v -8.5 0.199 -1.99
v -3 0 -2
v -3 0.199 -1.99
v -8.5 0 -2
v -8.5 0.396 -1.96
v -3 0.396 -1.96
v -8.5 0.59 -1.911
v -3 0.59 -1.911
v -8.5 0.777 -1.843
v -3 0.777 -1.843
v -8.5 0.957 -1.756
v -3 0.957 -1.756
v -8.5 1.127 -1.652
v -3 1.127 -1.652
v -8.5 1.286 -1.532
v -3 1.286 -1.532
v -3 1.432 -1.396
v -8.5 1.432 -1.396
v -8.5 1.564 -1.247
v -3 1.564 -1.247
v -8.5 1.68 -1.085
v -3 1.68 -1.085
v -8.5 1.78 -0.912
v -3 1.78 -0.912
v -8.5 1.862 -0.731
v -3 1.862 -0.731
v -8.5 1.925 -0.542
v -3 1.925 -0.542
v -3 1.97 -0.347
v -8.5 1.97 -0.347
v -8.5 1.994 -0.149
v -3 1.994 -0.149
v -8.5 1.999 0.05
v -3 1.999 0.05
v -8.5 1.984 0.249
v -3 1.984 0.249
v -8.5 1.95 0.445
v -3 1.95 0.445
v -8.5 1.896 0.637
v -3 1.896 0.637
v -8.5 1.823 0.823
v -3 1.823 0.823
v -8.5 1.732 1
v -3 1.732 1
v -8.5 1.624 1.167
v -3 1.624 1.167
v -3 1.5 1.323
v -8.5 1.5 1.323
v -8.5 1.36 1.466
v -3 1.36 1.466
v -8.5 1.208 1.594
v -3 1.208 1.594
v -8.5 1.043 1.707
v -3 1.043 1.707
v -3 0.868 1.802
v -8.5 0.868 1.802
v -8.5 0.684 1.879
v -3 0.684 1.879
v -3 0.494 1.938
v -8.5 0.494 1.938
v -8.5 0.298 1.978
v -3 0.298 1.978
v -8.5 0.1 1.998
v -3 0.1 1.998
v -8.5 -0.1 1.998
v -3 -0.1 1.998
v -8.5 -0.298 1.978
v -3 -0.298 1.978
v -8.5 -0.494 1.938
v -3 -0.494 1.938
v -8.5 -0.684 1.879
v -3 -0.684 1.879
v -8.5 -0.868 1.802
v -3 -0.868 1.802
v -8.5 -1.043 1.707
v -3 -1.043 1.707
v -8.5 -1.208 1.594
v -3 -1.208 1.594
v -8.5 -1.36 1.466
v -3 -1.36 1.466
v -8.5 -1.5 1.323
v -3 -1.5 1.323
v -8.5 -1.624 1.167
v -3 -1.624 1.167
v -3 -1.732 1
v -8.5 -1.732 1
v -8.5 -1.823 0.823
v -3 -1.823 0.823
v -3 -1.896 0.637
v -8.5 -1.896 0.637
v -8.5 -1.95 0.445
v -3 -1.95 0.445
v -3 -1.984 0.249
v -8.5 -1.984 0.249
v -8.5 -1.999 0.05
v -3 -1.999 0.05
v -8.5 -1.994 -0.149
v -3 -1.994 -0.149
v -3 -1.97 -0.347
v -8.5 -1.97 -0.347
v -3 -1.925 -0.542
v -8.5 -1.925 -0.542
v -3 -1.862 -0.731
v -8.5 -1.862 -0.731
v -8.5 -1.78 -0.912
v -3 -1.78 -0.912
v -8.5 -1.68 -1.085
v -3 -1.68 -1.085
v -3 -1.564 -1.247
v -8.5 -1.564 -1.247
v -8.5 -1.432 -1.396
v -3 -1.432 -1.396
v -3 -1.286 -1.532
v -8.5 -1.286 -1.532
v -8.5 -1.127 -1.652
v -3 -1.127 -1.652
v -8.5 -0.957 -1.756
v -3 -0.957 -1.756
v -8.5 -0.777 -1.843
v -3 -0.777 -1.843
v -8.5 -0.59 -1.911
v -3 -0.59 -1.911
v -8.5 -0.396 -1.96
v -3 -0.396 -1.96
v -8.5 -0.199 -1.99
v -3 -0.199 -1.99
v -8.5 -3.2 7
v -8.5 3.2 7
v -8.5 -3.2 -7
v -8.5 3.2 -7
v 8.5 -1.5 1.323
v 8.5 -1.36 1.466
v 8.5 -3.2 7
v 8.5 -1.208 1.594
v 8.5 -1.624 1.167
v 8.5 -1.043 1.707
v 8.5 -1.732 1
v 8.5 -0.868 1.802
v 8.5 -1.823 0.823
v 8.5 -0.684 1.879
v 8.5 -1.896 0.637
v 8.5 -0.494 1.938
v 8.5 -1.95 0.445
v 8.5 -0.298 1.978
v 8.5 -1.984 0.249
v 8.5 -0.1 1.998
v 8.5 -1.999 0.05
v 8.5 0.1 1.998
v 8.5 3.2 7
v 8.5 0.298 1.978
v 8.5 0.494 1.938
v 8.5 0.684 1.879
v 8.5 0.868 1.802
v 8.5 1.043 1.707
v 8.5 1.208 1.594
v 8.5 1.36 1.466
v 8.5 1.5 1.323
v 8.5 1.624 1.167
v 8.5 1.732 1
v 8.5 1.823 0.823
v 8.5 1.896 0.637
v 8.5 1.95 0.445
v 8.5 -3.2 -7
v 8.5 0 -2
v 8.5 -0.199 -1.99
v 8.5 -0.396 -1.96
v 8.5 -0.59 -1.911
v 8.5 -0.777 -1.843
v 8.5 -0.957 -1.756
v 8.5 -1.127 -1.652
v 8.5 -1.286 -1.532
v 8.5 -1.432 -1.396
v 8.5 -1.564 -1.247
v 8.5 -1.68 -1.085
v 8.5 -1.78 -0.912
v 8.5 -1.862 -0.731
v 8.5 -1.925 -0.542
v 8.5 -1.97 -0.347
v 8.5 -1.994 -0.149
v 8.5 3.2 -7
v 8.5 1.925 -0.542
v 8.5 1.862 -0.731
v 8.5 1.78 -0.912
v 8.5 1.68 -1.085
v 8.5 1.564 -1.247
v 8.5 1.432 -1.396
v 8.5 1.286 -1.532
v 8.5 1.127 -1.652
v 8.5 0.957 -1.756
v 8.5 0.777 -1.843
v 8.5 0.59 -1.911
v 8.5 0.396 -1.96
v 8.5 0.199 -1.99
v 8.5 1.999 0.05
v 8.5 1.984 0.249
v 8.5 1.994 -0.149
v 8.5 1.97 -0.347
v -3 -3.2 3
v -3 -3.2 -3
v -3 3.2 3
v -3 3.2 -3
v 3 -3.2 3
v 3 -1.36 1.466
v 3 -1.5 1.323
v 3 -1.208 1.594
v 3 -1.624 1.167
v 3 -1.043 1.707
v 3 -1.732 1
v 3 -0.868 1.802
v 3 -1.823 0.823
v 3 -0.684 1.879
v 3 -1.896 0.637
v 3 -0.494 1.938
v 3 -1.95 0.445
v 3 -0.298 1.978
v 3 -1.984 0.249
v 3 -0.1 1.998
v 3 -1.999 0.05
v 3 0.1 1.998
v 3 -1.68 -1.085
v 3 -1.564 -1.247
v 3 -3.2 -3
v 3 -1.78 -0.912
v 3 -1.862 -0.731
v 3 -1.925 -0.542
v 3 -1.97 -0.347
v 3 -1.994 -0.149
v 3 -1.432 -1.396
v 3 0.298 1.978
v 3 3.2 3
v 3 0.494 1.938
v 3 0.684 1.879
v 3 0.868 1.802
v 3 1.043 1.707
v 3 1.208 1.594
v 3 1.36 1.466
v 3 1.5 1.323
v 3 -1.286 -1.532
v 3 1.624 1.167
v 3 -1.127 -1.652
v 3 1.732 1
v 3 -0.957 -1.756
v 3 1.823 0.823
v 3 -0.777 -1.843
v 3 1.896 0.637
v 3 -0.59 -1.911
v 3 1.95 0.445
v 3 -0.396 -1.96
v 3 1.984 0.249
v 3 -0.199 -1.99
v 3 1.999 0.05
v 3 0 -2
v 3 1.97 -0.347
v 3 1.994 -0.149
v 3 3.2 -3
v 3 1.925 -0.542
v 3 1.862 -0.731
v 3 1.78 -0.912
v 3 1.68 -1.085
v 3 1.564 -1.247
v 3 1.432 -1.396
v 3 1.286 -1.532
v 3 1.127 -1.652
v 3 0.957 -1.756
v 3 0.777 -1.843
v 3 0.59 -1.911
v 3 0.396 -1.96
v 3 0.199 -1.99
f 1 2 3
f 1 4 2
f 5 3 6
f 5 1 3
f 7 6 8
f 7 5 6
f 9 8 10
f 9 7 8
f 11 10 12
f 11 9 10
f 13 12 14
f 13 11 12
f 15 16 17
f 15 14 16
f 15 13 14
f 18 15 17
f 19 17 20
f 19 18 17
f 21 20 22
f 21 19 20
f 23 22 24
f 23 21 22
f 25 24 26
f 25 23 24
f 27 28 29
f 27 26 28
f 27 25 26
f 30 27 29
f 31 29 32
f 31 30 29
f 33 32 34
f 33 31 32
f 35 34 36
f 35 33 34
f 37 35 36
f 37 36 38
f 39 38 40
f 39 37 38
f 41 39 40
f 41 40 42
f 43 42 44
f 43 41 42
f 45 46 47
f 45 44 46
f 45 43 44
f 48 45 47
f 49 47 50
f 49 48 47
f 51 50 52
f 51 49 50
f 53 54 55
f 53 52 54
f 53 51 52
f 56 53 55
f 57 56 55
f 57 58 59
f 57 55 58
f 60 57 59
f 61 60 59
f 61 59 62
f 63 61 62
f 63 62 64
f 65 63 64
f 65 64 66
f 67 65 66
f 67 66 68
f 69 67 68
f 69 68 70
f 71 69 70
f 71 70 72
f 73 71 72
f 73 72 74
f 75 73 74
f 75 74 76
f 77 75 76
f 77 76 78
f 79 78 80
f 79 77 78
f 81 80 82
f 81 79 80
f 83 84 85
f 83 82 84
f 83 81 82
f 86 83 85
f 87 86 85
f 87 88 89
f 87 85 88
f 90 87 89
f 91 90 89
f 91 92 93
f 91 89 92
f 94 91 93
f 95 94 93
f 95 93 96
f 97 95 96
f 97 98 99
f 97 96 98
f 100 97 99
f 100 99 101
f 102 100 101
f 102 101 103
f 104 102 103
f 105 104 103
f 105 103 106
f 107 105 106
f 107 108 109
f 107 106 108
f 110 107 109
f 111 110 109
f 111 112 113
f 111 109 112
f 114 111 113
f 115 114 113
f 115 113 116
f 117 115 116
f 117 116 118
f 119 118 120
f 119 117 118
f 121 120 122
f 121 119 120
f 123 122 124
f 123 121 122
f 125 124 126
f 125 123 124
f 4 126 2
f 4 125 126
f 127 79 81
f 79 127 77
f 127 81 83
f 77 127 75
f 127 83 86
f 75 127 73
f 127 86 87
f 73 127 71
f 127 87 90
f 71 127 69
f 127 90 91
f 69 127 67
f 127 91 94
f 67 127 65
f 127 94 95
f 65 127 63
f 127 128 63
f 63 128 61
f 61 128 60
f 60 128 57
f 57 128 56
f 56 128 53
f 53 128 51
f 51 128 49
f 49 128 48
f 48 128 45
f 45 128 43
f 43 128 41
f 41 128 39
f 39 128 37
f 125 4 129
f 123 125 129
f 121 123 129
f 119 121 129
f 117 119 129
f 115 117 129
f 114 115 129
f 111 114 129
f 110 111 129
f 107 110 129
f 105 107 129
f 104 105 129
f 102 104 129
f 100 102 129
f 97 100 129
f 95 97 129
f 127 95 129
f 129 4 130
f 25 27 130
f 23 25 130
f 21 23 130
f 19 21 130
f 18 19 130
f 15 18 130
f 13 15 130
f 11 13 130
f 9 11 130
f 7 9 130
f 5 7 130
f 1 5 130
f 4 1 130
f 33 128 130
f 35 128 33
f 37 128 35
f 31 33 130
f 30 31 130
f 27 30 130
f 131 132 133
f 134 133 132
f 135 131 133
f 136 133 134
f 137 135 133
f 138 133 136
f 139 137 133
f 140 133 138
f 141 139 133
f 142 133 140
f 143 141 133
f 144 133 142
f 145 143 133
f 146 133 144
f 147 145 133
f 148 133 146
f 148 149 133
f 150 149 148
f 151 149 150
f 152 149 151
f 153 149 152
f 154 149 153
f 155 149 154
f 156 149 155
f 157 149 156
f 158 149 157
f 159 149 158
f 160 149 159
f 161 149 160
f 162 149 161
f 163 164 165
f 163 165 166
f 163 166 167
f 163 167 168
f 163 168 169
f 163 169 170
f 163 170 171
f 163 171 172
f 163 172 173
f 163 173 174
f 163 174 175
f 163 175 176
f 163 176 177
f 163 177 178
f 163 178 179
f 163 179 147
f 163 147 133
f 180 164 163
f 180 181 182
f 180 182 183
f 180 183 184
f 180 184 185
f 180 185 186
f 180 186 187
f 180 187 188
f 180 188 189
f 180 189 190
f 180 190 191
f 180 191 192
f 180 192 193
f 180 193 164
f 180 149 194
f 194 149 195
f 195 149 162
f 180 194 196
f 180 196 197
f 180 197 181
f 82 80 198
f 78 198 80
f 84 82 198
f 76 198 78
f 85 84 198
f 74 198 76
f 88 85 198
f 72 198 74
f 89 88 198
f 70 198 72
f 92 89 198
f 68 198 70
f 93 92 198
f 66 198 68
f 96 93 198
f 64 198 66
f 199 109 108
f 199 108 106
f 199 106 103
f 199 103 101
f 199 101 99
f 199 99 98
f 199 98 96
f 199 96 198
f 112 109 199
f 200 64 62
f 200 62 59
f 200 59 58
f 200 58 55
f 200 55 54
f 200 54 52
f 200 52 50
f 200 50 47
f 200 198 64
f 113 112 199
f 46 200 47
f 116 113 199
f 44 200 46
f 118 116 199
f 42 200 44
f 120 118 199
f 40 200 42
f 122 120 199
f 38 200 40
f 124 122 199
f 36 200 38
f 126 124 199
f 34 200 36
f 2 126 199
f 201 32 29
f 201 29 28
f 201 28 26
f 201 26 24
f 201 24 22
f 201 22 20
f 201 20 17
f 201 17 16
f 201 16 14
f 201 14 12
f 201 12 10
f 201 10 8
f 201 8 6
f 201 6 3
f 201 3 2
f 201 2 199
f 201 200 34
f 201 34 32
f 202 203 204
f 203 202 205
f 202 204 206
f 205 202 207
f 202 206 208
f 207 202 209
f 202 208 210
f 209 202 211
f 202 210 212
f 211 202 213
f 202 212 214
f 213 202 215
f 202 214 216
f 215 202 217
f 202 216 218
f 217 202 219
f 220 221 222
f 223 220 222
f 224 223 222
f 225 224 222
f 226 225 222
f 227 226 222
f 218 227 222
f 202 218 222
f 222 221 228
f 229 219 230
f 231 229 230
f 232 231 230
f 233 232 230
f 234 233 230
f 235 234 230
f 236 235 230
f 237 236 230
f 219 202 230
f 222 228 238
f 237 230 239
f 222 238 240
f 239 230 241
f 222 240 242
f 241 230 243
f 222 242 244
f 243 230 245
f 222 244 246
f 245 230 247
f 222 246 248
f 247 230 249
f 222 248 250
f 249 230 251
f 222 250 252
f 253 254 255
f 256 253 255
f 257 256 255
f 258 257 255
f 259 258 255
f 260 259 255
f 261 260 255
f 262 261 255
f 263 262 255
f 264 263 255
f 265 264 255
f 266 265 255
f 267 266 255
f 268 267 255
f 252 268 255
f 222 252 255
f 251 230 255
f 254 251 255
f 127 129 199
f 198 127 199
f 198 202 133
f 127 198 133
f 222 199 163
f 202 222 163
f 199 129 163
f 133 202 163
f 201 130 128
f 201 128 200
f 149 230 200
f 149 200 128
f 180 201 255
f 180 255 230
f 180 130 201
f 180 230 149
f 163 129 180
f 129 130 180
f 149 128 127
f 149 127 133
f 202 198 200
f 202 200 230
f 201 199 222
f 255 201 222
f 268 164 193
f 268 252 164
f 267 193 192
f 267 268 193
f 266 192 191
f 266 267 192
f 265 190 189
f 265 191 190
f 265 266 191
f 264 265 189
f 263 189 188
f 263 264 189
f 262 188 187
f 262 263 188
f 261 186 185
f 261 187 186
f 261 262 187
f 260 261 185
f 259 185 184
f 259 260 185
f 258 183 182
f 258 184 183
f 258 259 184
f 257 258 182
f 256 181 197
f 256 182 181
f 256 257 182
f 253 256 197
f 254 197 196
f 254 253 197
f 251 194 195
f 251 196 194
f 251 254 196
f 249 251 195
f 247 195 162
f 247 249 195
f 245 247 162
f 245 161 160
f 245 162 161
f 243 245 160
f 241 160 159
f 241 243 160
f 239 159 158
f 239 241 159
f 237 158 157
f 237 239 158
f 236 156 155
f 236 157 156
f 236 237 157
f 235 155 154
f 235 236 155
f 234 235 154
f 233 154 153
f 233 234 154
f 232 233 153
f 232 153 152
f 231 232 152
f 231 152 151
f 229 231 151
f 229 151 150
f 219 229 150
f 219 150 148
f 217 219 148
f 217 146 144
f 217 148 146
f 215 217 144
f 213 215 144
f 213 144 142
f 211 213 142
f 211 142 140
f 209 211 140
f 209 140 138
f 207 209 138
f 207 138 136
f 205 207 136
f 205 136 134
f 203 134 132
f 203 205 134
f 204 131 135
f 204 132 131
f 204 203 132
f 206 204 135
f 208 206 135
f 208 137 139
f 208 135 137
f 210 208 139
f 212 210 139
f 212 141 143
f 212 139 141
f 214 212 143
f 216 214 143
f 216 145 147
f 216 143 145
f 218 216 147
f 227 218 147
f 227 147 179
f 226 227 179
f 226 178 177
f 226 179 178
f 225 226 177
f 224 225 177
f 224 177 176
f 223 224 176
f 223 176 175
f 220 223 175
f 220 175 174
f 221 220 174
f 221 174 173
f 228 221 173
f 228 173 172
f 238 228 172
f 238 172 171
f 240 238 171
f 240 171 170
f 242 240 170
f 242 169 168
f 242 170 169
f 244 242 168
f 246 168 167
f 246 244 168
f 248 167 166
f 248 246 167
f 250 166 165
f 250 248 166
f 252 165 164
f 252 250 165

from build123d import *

# Parameters (mm, degrees)
SKETCH1_W               = 17
SKETCH1_H               = 14
SKETCH1_W_2             = 6
SKETCH1_H_2             = 6
BOSS_EXTRUDE1_DEPTH     = 3.2
CUT_EXTRUDE1_DEPTH      = 12.466908912
CUT_EXTRUDE1_DEPTH_BACK = 12.466908912
SKETCH2_R               = 2


with BuildPart() as part:
    # Sketch1 → Boss-Extrude1 (new, symmetric)
    with BuildSketch(Plane(origin=(0, 0, 0), x_dir=(1, 0, 0), z_dir=(0, 1, 0))):
        Rectangle(SKETCH1_W, SKETCH1_H)
        Rectangle(SKETCH1_W_2, SKETCH1_H_2, mode=Mode.SUBTRACT)
    extrude(amount=BOSS_EXTRUDE1_DEPTH, both=True)

    # Sketch2 → Cut-Extrude1 (cut, two sides: drawn at the far end of the back side and taken through both)
    with BuildSketch(Plane(origin=(0, 0, 0), x_dir=(0, 0, -1), z_dir=(1, 0, 0)).offset(-CUT_EXTRUDE1_DEPTH_BACK)):
        Circle(SKETCH2_R)
    extrude(amount=CUT_EXTRUDE1_DEPTH + CUT_EXTRUDE1_DEPTH_BACK, mode=Mode.SUBTRACT)


solid = part.part
